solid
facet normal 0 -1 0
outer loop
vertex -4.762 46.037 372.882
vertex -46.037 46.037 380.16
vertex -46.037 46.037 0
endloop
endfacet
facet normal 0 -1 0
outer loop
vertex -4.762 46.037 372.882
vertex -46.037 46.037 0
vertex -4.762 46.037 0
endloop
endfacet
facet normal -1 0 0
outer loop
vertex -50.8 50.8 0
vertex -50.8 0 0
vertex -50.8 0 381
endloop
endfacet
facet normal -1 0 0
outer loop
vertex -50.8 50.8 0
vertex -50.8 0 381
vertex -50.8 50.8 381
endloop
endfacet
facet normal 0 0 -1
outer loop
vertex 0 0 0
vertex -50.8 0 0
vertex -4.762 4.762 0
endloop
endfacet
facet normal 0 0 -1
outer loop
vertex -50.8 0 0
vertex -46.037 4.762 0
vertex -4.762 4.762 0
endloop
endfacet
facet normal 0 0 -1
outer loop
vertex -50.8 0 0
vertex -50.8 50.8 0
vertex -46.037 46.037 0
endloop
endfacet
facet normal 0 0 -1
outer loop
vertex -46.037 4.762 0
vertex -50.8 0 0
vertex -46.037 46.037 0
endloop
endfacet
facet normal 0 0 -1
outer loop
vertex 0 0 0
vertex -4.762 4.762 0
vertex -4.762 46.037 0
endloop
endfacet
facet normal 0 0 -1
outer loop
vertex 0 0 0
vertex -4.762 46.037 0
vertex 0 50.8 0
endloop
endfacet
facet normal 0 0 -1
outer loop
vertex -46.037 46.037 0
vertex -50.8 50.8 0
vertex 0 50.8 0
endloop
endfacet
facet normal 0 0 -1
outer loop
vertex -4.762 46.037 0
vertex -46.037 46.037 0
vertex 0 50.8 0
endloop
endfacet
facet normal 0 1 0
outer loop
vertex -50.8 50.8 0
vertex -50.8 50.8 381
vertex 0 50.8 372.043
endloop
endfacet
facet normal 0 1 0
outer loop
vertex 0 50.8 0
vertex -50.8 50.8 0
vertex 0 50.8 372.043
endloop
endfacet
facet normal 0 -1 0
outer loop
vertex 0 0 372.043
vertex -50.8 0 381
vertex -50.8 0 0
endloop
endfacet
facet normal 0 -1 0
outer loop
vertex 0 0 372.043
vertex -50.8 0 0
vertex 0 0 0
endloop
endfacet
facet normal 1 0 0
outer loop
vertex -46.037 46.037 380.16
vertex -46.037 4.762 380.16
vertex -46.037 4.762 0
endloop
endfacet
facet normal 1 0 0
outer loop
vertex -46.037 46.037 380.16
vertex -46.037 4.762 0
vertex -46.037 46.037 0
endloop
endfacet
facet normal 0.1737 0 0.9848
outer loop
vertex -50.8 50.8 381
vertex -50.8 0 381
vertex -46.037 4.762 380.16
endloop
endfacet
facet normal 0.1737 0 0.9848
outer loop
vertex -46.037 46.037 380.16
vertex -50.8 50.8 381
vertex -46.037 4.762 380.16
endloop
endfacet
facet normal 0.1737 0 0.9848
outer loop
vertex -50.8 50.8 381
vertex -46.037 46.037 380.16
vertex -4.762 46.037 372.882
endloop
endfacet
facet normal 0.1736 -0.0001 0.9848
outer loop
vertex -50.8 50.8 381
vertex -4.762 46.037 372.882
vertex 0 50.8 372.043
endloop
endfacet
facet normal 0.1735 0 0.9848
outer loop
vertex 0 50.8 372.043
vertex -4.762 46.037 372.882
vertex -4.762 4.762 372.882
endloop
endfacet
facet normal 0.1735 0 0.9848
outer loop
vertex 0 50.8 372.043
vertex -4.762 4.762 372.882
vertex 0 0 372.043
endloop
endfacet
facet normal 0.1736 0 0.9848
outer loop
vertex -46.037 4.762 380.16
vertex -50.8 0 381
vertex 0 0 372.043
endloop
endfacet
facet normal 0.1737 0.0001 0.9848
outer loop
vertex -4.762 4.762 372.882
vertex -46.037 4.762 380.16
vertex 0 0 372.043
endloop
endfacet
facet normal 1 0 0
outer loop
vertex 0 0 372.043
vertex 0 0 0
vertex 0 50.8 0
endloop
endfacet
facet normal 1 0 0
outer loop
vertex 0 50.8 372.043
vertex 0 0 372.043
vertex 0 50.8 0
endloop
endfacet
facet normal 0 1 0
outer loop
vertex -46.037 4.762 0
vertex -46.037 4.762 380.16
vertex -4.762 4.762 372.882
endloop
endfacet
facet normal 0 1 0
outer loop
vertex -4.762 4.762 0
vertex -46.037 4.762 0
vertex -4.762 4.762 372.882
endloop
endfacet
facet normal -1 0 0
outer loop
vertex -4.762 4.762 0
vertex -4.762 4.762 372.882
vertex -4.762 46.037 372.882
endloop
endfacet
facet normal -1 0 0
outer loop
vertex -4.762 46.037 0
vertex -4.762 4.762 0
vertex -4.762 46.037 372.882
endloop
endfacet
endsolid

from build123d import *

# Parameters (mm, degrees)
F0_W     = 50.8
F0_H     = 50.8
F0_W_2   = 41.275
F0_H_2   = 41.275
F1_DEPTH = 381
F3_DEPTH = 50.801


with BuildPart() as f1:
    # F0 (on Top) → F1 (new body)
    with BuildSketch(Plane.XY):
        with Locations((-25.4, 25.4)):
            Rectangle(F0_W, F0_H)
        with Locations((-25.4, 25.4)):
            Rectangle(F0_W_2, F0_H_2, mode=Mode.SUBTRACT)
    extrude(amount=F1_DEPTH)

    # F2 (on face) → F3 (cut, through all)
    with BuildSketch(Plane.XZ):
        Polygon((0, 372.042589), (0, 381), (-50.8, 381), align=None)
    extrude(amount=-F3_DEPTH, mode=Mode.SUBTRACT)


solid = f1.part
